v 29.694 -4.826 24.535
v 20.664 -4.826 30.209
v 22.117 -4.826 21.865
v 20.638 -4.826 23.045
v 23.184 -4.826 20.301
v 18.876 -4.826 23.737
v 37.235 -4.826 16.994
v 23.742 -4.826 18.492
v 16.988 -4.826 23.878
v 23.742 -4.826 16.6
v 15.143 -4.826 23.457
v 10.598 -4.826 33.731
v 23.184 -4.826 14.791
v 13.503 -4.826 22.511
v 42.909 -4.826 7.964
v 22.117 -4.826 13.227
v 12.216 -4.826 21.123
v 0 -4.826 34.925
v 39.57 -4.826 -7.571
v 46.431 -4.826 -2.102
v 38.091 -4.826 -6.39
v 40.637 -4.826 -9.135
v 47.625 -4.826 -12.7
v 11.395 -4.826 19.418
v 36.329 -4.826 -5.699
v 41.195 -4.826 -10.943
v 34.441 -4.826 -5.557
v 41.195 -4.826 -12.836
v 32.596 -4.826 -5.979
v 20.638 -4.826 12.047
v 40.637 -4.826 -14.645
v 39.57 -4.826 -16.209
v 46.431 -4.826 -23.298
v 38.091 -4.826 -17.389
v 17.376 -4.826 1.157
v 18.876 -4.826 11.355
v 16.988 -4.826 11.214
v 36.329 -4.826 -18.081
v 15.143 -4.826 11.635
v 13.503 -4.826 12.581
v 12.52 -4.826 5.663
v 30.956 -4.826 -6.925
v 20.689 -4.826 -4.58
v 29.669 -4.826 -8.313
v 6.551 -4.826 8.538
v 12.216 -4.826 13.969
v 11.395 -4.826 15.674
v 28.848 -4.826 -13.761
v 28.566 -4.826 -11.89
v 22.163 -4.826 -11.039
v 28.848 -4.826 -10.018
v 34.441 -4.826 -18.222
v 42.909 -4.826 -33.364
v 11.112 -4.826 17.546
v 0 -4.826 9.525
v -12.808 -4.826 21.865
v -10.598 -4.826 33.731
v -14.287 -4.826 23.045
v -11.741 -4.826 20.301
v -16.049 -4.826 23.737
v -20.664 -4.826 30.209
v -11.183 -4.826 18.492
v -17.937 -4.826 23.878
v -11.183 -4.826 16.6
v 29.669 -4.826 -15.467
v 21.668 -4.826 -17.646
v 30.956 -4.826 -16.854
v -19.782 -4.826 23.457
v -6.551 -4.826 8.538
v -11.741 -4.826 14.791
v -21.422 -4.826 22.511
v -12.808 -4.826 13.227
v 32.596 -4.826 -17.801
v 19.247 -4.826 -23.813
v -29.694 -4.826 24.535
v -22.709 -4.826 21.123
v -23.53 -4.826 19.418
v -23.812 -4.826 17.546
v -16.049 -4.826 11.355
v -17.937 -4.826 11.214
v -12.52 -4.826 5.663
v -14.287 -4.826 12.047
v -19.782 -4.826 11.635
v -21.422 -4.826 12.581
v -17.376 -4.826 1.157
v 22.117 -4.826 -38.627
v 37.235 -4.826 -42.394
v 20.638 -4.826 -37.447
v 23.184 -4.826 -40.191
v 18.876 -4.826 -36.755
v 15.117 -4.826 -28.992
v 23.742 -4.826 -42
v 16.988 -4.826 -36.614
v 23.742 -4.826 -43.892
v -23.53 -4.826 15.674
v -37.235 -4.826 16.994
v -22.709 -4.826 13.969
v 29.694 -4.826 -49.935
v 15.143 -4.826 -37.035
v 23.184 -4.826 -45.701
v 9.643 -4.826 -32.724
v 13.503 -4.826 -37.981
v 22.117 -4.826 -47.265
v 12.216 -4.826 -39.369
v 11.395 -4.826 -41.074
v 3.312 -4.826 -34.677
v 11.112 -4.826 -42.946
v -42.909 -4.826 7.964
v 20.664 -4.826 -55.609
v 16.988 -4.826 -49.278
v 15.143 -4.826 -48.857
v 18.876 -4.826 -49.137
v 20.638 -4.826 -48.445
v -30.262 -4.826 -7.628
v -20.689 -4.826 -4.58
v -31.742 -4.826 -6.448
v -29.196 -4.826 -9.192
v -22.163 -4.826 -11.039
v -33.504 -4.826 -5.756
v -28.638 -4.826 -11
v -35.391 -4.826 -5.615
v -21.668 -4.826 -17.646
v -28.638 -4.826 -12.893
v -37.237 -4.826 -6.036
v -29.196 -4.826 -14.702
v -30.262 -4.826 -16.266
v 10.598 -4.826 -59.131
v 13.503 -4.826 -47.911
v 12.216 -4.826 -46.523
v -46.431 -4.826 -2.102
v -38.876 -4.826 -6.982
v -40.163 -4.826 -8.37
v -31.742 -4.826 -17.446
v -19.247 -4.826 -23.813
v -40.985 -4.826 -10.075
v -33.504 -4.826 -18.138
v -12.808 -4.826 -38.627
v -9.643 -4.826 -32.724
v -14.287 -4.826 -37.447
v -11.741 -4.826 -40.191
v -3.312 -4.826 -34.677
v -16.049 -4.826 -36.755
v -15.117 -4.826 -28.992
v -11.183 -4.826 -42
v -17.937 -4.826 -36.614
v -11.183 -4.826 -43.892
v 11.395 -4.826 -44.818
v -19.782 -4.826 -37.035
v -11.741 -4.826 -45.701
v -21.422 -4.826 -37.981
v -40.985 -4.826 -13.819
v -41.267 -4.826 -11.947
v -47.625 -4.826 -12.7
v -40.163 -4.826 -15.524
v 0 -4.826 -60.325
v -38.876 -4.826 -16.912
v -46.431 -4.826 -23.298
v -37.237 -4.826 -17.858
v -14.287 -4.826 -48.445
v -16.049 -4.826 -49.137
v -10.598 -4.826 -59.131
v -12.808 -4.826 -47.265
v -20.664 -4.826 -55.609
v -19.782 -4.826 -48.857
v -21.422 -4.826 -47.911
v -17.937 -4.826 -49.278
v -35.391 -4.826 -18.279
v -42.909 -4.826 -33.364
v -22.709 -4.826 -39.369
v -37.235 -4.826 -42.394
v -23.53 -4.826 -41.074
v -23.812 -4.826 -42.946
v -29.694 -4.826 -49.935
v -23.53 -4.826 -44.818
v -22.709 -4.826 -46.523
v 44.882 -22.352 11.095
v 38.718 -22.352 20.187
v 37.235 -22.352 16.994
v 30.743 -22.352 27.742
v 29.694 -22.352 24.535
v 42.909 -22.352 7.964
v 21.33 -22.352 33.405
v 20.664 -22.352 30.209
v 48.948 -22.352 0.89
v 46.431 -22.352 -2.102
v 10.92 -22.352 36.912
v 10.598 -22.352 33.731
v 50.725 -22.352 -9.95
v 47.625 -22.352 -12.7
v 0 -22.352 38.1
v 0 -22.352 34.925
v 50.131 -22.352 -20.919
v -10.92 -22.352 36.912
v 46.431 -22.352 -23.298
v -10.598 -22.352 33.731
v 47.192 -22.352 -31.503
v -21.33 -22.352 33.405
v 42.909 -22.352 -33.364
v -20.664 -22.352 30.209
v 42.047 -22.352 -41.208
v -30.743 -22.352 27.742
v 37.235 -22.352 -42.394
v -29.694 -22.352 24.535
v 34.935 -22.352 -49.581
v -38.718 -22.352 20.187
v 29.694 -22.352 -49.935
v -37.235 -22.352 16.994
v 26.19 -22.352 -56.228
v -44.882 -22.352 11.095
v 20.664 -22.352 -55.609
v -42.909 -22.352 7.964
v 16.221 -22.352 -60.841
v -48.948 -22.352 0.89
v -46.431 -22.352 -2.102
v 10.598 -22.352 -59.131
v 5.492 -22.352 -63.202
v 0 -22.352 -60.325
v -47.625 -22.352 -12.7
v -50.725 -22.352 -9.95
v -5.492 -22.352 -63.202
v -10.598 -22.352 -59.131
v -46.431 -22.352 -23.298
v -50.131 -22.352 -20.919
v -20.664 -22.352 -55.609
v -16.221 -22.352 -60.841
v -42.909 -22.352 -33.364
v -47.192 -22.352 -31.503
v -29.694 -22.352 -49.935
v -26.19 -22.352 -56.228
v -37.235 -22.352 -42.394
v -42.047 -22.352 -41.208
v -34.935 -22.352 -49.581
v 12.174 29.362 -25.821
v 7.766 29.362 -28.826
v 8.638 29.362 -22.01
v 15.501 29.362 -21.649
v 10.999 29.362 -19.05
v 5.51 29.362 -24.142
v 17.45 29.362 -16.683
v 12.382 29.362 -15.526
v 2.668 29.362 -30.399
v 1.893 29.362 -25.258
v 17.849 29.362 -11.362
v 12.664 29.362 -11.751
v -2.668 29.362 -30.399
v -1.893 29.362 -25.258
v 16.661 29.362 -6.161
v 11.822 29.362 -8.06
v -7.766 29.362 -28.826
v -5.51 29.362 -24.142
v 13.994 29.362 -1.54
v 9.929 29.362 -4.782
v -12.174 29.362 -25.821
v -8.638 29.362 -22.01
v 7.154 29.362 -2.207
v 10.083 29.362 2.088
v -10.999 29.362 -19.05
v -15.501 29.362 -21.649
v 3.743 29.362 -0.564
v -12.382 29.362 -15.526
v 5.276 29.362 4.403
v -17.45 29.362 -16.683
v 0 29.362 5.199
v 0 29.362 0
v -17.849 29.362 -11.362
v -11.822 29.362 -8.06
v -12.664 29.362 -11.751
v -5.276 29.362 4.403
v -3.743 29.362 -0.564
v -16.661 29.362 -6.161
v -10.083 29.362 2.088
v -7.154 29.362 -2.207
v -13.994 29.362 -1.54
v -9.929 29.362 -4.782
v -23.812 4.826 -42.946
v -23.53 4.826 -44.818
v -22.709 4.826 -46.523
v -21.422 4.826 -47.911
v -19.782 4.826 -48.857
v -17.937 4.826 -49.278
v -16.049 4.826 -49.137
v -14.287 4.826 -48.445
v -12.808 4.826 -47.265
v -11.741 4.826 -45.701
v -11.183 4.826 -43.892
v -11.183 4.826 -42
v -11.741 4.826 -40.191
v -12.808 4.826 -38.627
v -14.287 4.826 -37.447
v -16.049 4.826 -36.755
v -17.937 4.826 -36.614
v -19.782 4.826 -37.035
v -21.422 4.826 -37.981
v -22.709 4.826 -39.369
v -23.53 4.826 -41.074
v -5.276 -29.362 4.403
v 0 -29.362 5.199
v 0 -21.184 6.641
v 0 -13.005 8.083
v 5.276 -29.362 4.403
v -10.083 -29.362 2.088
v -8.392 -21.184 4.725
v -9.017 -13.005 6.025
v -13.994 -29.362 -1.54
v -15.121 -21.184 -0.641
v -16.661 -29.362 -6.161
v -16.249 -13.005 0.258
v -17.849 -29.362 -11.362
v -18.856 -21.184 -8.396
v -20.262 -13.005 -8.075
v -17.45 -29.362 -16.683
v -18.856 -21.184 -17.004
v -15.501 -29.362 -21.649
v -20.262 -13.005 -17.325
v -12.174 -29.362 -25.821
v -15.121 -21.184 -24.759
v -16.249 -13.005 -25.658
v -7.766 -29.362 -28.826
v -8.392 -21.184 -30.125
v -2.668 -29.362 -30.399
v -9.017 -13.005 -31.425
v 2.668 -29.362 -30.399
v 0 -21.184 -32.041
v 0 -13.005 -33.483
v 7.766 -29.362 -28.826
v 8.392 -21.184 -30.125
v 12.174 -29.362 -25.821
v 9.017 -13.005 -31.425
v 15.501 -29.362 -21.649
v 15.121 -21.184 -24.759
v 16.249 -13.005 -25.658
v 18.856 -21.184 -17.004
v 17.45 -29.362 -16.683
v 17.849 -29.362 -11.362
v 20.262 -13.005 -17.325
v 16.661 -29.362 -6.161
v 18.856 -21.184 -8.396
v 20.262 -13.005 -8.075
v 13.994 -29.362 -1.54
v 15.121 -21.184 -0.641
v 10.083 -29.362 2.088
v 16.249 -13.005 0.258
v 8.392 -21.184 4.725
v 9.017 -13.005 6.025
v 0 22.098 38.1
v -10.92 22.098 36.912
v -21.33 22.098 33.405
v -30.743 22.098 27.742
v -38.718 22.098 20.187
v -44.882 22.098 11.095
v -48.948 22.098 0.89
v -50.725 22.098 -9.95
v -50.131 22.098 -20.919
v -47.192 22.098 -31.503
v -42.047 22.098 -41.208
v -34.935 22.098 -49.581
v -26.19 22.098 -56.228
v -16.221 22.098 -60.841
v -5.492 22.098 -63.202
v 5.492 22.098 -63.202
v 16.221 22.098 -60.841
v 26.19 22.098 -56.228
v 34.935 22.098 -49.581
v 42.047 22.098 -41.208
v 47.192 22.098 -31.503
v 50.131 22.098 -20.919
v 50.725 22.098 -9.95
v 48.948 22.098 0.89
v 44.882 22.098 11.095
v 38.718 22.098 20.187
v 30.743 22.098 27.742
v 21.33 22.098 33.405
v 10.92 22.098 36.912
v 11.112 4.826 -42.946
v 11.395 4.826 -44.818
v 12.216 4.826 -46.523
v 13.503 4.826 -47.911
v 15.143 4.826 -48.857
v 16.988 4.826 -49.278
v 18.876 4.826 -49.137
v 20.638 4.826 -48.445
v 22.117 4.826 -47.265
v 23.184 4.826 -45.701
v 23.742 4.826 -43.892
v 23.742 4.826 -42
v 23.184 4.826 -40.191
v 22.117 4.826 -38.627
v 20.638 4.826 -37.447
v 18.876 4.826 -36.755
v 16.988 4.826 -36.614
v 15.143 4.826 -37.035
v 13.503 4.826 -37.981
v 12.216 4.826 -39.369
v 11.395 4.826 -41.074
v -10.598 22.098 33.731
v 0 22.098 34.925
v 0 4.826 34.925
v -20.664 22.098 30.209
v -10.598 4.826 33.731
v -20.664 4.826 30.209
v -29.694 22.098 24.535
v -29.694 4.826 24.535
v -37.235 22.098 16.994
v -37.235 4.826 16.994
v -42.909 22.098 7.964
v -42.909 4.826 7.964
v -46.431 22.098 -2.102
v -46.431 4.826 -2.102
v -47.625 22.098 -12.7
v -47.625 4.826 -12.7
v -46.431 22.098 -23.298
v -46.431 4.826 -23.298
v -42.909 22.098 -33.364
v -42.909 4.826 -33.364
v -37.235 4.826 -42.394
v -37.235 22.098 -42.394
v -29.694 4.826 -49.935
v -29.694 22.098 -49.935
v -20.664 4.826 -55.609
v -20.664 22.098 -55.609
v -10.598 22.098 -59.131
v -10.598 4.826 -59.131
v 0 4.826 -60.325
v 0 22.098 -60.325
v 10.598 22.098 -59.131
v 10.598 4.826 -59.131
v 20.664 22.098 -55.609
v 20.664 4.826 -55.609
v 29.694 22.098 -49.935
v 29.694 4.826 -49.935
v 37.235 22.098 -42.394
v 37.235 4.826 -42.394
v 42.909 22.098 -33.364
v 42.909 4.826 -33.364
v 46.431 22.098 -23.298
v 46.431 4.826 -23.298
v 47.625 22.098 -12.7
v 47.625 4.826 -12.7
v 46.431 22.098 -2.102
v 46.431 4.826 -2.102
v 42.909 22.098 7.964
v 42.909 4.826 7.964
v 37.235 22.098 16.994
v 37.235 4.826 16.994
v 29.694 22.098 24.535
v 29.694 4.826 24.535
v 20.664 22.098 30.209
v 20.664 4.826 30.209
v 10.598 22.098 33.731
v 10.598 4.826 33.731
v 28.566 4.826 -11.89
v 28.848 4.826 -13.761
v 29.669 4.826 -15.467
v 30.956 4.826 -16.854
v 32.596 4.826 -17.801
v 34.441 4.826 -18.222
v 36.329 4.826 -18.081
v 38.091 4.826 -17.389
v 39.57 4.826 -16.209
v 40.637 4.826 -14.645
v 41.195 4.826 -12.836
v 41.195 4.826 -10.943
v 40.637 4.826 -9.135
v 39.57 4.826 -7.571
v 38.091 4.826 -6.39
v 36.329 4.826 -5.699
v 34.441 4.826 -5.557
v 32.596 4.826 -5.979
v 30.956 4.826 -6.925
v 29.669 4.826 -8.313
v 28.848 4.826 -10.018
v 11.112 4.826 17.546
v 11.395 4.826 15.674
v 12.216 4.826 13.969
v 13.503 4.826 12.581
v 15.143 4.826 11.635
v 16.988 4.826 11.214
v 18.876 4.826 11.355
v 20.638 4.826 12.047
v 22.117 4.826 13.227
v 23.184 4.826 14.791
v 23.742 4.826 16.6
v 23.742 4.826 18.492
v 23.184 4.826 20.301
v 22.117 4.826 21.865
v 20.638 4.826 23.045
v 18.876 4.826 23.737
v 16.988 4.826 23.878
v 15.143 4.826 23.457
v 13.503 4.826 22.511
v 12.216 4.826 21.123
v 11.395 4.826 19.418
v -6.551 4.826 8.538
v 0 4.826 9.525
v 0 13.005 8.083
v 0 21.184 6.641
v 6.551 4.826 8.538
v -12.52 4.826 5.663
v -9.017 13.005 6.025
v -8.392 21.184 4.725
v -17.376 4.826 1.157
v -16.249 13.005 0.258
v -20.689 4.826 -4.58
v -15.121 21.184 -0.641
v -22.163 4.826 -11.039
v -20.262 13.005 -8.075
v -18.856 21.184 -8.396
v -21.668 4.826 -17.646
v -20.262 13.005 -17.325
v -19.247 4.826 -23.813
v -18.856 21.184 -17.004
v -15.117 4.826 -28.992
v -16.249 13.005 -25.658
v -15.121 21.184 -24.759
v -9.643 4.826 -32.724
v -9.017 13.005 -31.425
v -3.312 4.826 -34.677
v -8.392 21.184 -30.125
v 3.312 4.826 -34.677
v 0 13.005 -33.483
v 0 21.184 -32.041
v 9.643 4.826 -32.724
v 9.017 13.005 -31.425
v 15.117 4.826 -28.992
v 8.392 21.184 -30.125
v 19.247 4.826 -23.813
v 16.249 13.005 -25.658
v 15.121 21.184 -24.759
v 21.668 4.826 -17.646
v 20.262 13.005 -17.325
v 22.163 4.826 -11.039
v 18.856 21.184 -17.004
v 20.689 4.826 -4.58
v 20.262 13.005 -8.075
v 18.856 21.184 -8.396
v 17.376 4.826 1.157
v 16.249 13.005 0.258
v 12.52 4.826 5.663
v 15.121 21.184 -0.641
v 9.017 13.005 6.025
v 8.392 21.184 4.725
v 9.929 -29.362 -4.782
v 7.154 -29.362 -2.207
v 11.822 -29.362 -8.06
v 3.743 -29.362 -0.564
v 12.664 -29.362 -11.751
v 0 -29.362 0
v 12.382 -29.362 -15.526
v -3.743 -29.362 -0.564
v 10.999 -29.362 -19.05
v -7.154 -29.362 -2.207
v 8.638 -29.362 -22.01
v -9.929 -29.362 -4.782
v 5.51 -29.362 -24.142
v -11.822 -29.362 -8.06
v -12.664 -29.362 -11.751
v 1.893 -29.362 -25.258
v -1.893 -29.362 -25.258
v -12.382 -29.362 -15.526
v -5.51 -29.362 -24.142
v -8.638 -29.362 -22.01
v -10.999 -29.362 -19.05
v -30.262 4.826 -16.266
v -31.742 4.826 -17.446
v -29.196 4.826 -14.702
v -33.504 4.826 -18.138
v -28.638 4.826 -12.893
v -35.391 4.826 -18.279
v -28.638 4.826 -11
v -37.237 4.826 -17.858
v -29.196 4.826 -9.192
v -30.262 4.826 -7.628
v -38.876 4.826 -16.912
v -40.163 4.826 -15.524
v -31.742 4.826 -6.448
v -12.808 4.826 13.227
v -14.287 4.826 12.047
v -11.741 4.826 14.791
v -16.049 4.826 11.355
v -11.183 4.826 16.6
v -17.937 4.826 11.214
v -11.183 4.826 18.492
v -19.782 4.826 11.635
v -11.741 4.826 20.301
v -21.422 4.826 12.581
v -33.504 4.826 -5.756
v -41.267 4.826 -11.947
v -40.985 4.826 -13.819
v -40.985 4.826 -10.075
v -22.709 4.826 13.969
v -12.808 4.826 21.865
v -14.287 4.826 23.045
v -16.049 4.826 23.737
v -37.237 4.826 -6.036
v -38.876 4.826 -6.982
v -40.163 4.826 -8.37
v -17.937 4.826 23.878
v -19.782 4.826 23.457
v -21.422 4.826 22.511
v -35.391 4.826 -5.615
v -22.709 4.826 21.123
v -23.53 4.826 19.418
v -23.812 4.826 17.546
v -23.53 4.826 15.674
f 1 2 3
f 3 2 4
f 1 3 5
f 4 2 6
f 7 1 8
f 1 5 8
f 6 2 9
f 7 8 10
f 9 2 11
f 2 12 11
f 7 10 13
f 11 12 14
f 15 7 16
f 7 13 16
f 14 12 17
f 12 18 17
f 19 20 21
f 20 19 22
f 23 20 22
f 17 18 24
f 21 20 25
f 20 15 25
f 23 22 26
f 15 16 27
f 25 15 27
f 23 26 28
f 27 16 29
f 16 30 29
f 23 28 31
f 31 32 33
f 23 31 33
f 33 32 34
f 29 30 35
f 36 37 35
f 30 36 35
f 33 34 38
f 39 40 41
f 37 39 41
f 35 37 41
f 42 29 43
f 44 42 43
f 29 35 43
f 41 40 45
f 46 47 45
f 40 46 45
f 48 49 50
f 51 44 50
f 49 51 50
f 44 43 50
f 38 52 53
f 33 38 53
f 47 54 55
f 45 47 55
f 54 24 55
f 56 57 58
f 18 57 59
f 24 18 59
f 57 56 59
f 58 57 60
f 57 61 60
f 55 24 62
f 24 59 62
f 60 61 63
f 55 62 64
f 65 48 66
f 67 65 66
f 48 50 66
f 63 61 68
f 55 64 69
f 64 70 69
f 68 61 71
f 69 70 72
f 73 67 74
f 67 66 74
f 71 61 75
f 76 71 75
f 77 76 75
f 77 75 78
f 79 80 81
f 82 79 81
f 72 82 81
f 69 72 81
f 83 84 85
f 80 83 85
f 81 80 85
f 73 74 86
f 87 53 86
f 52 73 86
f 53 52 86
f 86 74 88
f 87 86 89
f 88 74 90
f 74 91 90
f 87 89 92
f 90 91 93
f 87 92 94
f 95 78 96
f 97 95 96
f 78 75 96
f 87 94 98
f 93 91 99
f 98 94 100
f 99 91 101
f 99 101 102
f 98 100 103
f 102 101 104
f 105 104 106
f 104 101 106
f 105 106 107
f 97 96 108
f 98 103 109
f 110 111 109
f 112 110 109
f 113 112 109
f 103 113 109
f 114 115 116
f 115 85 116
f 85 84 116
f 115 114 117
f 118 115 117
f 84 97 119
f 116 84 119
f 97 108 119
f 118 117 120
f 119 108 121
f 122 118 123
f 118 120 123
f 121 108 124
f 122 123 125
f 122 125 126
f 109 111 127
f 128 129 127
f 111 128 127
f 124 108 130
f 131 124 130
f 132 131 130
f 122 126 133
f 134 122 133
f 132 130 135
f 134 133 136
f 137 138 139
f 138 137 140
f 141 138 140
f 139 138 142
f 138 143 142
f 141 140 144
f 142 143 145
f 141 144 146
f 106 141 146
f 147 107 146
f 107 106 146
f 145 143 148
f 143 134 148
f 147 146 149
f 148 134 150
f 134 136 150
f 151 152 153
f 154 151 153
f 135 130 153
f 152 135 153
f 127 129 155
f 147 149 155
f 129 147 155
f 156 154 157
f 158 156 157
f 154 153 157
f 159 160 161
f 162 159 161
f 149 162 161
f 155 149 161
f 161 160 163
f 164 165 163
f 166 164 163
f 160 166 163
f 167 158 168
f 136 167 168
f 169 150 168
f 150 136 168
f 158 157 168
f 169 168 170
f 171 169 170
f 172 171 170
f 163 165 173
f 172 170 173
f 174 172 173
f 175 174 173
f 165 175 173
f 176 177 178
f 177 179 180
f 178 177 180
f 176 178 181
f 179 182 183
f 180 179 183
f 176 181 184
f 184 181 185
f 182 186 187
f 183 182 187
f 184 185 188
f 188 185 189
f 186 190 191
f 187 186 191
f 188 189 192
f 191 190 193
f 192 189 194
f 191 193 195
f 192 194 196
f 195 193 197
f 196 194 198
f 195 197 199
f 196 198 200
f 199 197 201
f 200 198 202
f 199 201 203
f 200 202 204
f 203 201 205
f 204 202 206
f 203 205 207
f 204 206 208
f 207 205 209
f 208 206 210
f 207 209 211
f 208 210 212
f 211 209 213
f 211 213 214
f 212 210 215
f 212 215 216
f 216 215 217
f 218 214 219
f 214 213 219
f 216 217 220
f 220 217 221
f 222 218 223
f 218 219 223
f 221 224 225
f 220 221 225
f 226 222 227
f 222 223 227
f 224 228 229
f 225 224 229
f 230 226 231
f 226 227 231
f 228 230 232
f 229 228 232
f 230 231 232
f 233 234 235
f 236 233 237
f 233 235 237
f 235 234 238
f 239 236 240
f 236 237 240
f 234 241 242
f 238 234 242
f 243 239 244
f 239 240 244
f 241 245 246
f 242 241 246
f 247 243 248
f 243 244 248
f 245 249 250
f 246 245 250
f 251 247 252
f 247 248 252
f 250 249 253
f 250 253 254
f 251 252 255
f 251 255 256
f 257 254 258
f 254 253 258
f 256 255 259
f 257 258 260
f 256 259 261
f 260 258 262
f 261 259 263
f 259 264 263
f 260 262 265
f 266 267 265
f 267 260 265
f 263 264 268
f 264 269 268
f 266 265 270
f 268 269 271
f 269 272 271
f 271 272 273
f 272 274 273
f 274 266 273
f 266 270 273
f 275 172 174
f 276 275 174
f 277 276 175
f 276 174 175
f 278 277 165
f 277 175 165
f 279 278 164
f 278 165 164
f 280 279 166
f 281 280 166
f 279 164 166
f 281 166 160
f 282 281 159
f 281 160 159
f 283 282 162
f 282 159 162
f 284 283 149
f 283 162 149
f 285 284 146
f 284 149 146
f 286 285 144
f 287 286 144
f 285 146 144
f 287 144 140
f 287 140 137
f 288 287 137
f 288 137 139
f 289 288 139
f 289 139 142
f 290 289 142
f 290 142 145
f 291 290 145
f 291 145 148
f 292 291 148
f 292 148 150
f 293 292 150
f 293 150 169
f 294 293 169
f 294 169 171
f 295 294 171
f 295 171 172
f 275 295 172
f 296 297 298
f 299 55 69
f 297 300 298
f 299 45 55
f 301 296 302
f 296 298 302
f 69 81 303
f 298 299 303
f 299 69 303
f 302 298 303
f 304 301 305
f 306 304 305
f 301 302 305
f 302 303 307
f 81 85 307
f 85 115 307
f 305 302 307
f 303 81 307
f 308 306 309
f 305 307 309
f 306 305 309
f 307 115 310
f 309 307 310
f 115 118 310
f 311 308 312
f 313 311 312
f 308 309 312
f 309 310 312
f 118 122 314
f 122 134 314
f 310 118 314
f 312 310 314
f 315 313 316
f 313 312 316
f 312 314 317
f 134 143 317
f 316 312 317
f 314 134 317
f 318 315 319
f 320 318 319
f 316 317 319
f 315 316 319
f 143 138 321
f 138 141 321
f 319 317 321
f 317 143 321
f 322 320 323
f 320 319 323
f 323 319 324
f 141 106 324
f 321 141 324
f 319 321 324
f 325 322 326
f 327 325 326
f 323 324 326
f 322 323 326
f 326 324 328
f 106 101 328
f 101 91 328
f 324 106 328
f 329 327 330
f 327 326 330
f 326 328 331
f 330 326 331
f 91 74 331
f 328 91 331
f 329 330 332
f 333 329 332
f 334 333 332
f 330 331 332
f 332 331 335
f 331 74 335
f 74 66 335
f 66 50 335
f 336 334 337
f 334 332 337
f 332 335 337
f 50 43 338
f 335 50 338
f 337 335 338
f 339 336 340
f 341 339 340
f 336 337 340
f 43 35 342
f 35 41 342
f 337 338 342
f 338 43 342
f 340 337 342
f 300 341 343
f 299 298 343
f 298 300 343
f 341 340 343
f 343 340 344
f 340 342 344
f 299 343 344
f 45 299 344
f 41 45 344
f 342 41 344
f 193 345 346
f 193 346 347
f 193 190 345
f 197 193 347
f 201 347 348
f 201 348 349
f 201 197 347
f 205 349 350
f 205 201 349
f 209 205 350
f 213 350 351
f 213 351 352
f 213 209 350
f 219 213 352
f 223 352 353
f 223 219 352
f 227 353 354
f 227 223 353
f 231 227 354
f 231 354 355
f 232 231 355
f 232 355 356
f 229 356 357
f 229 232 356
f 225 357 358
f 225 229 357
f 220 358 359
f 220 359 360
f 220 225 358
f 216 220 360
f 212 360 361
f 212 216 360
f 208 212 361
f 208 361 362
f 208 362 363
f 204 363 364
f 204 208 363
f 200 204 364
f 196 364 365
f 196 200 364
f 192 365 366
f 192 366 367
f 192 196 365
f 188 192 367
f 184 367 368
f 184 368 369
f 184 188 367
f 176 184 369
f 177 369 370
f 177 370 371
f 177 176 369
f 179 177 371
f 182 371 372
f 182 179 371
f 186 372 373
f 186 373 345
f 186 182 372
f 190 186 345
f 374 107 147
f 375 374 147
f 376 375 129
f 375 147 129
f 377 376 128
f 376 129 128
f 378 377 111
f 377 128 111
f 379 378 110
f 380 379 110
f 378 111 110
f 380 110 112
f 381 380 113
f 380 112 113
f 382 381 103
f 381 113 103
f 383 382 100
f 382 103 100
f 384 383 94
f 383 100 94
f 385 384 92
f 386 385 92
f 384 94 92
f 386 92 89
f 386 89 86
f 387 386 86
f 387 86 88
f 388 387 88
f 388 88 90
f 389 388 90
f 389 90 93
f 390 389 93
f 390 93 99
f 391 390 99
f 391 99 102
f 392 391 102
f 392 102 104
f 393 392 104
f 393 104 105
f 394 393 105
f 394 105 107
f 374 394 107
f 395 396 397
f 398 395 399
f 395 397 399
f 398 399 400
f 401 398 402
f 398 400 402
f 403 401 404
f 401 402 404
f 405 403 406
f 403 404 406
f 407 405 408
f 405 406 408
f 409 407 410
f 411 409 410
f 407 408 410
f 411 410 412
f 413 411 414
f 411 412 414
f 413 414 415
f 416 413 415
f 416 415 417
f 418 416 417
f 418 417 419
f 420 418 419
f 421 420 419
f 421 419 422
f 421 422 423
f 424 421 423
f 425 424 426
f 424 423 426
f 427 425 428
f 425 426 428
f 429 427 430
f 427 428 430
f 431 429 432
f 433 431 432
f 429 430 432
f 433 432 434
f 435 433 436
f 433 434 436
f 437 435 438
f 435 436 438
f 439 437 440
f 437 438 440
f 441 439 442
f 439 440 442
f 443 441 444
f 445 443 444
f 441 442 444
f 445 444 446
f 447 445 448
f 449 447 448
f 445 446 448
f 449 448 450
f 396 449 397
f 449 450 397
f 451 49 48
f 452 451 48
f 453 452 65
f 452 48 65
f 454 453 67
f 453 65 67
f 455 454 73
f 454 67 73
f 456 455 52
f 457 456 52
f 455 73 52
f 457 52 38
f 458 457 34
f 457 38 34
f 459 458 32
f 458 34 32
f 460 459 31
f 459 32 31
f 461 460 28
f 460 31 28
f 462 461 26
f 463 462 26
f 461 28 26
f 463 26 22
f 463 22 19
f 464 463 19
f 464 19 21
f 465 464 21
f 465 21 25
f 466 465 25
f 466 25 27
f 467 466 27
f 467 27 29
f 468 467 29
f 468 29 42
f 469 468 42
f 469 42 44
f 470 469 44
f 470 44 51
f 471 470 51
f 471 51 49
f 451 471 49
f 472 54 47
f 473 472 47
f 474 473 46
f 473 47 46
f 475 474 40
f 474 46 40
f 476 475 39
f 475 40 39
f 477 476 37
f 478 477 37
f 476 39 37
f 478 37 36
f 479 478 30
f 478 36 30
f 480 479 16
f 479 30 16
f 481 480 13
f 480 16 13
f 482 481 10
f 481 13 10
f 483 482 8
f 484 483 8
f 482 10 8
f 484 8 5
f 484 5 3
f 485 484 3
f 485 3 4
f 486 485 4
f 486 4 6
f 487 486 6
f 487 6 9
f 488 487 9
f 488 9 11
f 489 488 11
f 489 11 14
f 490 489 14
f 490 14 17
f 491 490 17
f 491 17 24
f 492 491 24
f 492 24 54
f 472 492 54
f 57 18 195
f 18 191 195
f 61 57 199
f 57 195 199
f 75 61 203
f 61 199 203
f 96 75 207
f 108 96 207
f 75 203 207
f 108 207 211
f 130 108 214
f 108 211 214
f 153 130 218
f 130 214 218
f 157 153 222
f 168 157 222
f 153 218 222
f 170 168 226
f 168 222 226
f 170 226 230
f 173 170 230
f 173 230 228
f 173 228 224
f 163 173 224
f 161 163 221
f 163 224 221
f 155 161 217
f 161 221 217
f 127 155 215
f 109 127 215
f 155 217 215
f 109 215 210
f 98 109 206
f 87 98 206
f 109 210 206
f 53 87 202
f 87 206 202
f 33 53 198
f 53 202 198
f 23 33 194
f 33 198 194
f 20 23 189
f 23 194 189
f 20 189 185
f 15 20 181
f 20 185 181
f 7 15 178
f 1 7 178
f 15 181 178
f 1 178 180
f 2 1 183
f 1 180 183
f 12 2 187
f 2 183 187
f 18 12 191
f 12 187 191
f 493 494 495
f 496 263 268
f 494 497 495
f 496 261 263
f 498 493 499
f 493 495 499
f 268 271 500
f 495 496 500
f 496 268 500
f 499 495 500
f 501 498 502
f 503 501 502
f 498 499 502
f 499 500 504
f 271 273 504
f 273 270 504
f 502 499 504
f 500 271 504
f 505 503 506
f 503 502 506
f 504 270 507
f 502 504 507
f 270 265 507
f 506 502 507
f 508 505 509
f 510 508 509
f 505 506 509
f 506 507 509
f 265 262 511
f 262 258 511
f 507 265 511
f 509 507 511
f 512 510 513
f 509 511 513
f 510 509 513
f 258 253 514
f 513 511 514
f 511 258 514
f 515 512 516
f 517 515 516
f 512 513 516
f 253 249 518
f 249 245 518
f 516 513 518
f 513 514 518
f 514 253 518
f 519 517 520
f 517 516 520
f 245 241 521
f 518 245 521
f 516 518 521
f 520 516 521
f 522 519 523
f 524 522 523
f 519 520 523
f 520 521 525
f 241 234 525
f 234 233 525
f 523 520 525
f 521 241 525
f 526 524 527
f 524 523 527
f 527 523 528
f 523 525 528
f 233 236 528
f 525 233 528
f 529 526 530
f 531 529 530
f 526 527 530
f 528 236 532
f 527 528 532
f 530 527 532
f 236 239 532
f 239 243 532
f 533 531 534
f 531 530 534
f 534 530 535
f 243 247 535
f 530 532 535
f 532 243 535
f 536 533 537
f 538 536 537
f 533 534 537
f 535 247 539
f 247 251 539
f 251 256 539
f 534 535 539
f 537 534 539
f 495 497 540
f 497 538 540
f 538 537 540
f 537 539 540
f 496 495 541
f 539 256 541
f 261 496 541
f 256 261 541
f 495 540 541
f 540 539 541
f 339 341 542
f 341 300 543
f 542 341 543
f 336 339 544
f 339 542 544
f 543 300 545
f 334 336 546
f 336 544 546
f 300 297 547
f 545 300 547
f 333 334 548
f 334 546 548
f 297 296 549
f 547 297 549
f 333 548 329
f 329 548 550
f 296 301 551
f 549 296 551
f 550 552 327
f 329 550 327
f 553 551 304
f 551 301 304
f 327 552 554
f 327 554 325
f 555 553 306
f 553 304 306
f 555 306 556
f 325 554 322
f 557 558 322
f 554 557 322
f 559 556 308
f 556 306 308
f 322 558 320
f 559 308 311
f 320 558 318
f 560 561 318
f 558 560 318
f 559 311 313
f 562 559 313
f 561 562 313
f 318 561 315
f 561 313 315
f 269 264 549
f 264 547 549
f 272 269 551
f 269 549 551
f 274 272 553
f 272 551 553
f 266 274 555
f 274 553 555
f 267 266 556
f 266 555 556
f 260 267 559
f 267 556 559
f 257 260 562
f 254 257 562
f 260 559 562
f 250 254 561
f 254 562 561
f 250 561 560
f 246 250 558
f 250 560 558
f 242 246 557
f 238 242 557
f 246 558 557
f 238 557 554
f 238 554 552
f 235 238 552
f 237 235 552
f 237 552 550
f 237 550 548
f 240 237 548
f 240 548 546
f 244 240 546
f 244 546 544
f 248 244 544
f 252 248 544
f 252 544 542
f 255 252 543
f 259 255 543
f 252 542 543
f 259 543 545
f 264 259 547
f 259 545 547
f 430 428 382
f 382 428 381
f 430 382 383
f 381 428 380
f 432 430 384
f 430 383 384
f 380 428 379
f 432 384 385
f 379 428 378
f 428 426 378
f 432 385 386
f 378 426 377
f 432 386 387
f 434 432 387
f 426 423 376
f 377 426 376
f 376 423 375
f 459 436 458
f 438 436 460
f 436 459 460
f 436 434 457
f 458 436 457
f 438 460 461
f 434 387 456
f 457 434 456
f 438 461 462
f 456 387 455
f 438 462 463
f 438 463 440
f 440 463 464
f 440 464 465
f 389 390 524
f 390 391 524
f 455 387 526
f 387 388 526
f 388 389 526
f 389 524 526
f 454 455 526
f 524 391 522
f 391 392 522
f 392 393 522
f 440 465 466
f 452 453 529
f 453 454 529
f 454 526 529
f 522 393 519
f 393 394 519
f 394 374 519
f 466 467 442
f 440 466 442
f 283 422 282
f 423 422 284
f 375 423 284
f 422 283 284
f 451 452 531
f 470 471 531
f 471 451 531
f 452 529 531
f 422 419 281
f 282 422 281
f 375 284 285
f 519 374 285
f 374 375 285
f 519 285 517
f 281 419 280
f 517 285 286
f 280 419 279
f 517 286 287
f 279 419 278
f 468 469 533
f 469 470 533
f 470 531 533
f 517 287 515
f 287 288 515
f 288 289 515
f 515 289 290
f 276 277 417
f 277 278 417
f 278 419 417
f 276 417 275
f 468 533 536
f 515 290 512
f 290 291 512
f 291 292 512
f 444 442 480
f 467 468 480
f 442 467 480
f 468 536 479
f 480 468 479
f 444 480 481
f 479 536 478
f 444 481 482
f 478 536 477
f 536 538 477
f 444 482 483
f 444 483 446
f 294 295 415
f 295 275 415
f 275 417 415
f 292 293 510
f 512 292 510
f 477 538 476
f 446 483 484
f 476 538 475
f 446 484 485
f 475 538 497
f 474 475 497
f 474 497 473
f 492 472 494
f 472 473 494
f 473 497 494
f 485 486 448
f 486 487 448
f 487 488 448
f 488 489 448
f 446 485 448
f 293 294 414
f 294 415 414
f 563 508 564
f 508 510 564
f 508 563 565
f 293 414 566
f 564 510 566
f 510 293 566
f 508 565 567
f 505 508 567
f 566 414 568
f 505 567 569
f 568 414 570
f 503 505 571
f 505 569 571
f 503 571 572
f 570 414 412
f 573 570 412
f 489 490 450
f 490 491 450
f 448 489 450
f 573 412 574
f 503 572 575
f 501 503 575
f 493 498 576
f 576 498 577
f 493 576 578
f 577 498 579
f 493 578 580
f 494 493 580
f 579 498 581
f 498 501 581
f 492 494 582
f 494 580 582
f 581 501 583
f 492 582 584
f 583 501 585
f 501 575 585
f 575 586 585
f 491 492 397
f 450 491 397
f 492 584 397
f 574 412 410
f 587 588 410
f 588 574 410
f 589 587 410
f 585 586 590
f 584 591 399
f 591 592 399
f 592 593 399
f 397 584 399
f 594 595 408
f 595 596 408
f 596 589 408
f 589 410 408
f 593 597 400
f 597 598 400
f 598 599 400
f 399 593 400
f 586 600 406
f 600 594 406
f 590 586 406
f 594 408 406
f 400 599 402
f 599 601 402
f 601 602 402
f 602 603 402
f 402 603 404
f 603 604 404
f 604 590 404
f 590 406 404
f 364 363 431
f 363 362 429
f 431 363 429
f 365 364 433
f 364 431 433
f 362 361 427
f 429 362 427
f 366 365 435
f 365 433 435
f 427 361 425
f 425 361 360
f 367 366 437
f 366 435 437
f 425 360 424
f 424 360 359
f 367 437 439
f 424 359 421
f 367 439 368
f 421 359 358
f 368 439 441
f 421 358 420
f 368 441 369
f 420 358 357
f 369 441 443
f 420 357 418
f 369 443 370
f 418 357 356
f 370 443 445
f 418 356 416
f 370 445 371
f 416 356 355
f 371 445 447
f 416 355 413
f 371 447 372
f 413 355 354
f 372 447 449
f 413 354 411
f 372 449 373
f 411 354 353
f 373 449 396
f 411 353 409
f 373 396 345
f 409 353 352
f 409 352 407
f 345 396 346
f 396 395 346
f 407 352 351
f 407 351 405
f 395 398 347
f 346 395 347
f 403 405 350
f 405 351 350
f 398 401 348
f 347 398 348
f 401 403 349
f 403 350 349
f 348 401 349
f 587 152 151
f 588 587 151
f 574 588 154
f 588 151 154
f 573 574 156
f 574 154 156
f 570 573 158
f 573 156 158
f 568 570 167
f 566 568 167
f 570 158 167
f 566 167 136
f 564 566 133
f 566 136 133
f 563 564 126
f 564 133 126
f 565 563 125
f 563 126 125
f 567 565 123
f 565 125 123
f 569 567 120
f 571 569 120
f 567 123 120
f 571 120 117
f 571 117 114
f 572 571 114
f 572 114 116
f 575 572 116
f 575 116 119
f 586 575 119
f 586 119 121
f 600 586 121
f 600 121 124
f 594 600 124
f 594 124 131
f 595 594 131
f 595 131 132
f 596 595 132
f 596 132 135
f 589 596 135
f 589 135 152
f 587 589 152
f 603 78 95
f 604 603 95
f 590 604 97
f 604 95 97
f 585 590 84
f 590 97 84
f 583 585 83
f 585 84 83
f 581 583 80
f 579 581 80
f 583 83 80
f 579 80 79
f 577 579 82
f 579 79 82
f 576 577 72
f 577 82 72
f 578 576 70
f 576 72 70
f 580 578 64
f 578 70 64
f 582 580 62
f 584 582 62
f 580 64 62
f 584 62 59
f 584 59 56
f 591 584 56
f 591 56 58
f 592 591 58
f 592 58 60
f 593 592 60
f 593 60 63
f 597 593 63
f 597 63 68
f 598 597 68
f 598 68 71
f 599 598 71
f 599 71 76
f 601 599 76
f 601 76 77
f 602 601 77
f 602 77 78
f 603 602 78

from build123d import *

# Parameters (mm, degrees)
F_1_4_0_5_DIAMETER_HOLE2_D = 12.7


with BuildPart() as part:
    # Sketch1 → Revolve3 (revolve)
    with BuildSketch(Plane(origin=(0, 0, 0), x_dir=(0, 0, -1), z_dir=(1, 0, 0))):
        Polygon((-38.1, 0), (-38.1, 22.098), (-34.925, 22.098), (-34.925, 4.826), (-9.525, 4.826), (-5.198570671, 29.3624), (0, 29.3624), (0, -29.3624), (-5.198570671, -29.3624), (-9.525, -4.826), (-34.925, -4.826), (-34.925, -22.352), (-38.1, -22.352), align=None)
    revolve(axis=Axis((0, 29.3624, -12.7), (0, -1, 0)))

    # 1/4 (0.5) Diameter Hole2 (through all)
    with Locations(Plane(origin=(0, 4.826, 0), x_dir=(1, 0, 0), z_dir=(0, 1, 0))):
        with Locations((-17.4625, 42.945937227), (17.4625, 42.945937227), (34.91559931, 11.889722379), (17.4625, -17.545937227), (-17.4625, -17.545937227), (-34.916879179, 11.946890841)):
            Hole(F_1_4_0_5_DIAMETER_HOLE2_D / 2)


solid = part.part
